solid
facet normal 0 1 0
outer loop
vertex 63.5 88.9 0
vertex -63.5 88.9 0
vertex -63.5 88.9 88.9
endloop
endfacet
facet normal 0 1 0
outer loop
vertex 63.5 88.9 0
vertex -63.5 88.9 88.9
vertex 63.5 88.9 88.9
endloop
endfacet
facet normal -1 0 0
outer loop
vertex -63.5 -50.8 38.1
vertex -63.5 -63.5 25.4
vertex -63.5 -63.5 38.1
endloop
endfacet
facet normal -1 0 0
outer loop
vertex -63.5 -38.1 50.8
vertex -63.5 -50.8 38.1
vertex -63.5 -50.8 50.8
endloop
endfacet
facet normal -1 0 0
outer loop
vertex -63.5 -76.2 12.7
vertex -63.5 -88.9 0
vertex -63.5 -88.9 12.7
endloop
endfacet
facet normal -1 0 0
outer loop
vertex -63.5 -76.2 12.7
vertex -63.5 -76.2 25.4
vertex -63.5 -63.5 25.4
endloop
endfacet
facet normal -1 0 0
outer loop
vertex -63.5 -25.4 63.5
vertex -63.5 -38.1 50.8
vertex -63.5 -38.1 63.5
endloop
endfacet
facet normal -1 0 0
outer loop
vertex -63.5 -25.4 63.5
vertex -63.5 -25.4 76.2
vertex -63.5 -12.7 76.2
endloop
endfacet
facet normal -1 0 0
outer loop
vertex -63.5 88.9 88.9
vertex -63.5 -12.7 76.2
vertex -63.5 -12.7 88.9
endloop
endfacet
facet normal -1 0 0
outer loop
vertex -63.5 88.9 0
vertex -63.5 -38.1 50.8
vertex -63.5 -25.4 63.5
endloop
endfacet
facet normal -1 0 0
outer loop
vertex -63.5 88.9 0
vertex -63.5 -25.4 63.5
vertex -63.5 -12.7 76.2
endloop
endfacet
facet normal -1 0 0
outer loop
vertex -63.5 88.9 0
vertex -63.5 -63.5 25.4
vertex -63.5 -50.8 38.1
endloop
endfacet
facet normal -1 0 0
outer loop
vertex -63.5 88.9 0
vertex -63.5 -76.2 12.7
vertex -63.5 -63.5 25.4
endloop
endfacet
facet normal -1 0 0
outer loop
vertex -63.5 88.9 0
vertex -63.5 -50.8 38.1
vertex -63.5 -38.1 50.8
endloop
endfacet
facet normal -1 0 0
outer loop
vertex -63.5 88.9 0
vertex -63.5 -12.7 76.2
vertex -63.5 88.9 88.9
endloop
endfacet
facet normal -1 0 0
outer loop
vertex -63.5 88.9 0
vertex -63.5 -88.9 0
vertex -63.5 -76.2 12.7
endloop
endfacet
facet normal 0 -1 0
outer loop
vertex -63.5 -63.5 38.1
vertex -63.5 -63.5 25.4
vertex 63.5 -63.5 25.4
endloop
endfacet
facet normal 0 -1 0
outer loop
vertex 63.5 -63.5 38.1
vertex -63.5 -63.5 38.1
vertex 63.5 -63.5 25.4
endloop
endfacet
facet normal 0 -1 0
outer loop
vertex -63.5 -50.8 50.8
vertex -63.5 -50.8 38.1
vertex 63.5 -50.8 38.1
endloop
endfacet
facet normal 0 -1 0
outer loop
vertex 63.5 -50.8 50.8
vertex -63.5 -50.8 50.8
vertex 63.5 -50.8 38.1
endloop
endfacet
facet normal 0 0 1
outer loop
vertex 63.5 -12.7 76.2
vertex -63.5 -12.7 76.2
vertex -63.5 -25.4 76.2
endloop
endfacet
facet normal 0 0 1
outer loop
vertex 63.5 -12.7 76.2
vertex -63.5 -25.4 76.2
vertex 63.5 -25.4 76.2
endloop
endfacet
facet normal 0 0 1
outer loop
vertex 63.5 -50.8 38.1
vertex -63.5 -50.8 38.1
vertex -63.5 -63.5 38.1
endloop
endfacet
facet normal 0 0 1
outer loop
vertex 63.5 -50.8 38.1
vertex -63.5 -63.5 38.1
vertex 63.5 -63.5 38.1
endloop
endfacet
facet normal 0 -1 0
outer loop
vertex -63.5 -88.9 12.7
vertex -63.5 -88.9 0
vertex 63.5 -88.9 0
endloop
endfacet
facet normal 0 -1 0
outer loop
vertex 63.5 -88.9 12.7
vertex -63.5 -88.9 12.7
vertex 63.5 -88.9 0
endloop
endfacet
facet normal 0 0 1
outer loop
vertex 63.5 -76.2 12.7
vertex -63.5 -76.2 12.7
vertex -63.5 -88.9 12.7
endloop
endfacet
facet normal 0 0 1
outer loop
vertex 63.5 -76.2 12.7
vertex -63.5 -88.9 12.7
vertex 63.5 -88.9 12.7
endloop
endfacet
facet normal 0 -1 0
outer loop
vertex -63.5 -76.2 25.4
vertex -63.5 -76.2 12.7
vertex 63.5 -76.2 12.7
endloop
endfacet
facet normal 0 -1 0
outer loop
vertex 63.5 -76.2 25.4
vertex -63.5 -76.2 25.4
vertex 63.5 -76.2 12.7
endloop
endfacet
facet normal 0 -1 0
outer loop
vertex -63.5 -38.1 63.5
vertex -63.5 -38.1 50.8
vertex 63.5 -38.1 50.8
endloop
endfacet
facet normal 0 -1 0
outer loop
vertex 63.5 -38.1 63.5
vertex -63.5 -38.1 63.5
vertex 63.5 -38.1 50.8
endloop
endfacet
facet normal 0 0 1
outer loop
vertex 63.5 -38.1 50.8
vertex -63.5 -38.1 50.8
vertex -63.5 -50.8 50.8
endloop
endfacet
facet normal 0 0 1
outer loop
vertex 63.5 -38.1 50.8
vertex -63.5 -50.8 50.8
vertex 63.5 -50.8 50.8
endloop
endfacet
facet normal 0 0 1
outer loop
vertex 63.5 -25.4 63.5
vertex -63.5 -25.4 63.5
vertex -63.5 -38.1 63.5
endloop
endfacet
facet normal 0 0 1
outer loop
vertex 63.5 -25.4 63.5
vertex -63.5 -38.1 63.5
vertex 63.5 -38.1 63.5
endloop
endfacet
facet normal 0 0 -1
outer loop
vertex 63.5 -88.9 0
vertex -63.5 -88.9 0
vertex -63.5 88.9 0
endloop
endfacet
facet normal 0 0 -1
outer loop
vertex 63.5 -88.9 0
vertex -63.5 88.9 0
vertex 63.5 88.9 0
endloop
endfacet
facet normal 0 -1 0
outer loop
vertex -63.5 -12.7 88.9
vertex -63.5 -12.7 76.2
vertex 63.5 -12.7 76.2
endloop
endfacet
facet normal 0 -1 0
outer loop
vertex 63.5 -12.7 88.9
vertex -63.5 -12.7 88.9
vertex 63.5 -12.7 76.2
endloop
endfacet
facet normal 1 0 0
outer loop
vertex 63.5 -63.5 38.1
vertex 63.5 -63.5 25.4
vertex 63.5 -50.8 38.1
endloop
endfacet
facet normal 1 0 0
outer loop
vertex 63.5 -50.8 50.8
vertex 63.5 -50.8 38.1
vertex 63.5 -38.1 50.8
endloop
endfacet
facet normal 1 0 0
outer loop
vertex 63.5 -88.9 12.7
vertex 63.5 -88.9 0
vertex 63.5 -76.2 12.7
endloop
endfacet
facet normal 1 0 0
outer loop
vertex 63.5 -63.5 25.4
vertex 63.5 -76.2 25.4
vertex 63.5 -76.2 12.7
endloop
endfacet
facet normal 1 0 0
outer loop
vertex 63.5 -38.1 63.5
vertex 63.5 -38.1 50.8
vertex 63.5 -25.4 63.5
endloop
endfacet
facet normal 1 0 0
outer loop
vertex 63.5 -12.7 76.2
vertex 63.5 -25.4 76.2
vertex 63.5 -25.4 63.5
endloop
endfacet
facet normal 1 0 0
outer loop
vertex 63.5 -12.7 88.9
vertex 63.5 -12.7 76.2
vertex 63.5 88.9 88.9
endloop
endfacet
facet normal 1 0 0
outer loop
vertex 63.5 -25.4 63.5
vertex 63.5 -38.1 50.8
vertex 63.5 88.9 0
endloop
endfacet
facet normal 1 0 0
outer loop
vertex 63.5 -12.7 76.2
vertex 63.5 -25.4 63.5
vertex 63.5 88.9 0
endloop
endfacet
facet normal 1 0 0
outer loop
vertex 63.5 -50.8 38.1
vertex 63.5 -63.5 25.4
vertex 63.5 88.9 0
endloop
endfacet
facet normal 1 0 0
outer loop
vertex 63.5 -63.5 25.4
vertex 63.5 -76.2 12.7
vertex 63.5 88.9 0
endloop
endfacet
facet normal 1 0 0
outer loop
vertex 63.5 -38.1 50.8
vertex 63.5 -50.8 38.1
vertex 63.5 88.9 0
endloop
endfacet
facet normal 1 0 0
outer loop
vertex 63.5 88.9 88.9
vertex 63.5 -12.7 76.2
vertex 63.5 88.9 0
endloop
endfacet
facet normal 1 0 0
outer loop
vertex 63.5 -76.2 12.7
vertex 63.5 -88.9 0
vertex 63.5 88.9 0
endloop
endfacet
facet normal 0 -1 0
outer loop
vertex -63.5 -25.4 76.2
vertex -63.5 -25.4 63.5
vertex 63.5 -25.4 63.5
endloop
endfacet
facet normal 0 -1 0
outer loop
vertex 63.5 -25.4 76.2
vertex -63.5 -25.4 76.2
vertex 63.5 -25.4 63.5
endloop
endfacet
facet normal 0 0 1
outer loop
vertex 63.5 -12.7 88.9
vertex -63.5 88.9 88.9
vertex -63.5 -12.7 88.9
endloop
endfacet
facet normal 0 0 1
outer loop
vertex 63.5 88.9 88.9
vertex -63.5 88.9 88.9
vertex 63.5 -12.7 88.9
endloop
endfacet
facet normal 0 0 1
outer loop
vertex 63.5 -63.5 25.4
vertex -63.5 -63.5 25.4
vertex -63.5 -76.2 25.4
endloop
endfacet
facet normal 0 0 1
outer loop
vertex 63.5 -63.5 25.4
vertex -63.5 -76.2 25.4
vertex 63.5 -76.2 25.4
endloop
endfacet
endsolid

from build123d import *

# Parameters (mm, degrees)
F0_W      = 127
F0_H      = 177.8
F1_DEPTH  = 12.7
F2_W      = 127
F2_H      = 165.1
F3_DEPTH  = 12.7
F4_W      = 127
F4_H      = 152.4
F5_DEPTH  = 12.7
F6_W      = 127
F6_H      = 139.7
F7_DEPTH  = 12.7
F8_W      = 127
F8_H      = 127
F9_DEPTH  = 12.7
F10_W     = 127
F10_H     = 114.3
F11_DEPTH = 12.7
F12_W     = 127
F12_H     = 101.6
F13_DEPTH = 12.7


with BuildPart() as f1:
    # F0 (on Top) → F1 (new body)
    with BuildSketch(Plane.XY):
        Rectangle(F0_W, F0_H)
    extrude(amount=F1_DEPTH)

    # F2 (on face) → F3 (join)
    with BuildSketch(Plane.XY.offset(12.7)):
        with Locations((0, 6.35)):
            Rectangle(F2_W, F2_H)
    extrude(amount=F3_DEPTH)

    # F4 (on face) → F5 (join)
    with BuildSketch(Plane.XY.offset(25.4)):
        with Locations((0, 12.7)):
            Rectangle(F4_W, F4_H)
    extrude(amount=F5_DEPTH)

    # F6 (on face) → F7 (join)
    with BuildSketch(Plane.XY.offset(38.1)):
        with Locations((0, 19.05)):
            Rectangle(F6_W, F6_H)
    extrude(amount=F7_DEPTH)

    # F8 (on face) → F9 (join)
    with BuildSketch(Plane.XY.offset(50.8)):
        with Locations((0, 25.4)):
            Rectangle(F8_W, F8_H)
    extrude(amount=F9_DEPTH)

    # F10 (on face) → F11 (join)
    with BuildSketch(Plane.XY.offset(63.5)):
        with Locations((0, 31.75)):
            Rectangle(F10_W, F10_H)
    extrude(amount=F11_DEPTH)

    # F12 (on face) → F13 (join)
    with BuildSketch(Plane.XY.offset(76.2)):
        with Locations((0, 38.1)):
            Rectangle(F12_W, F12_H)
    extrude(amount=F13_DEPTH)


solid = f1.part
